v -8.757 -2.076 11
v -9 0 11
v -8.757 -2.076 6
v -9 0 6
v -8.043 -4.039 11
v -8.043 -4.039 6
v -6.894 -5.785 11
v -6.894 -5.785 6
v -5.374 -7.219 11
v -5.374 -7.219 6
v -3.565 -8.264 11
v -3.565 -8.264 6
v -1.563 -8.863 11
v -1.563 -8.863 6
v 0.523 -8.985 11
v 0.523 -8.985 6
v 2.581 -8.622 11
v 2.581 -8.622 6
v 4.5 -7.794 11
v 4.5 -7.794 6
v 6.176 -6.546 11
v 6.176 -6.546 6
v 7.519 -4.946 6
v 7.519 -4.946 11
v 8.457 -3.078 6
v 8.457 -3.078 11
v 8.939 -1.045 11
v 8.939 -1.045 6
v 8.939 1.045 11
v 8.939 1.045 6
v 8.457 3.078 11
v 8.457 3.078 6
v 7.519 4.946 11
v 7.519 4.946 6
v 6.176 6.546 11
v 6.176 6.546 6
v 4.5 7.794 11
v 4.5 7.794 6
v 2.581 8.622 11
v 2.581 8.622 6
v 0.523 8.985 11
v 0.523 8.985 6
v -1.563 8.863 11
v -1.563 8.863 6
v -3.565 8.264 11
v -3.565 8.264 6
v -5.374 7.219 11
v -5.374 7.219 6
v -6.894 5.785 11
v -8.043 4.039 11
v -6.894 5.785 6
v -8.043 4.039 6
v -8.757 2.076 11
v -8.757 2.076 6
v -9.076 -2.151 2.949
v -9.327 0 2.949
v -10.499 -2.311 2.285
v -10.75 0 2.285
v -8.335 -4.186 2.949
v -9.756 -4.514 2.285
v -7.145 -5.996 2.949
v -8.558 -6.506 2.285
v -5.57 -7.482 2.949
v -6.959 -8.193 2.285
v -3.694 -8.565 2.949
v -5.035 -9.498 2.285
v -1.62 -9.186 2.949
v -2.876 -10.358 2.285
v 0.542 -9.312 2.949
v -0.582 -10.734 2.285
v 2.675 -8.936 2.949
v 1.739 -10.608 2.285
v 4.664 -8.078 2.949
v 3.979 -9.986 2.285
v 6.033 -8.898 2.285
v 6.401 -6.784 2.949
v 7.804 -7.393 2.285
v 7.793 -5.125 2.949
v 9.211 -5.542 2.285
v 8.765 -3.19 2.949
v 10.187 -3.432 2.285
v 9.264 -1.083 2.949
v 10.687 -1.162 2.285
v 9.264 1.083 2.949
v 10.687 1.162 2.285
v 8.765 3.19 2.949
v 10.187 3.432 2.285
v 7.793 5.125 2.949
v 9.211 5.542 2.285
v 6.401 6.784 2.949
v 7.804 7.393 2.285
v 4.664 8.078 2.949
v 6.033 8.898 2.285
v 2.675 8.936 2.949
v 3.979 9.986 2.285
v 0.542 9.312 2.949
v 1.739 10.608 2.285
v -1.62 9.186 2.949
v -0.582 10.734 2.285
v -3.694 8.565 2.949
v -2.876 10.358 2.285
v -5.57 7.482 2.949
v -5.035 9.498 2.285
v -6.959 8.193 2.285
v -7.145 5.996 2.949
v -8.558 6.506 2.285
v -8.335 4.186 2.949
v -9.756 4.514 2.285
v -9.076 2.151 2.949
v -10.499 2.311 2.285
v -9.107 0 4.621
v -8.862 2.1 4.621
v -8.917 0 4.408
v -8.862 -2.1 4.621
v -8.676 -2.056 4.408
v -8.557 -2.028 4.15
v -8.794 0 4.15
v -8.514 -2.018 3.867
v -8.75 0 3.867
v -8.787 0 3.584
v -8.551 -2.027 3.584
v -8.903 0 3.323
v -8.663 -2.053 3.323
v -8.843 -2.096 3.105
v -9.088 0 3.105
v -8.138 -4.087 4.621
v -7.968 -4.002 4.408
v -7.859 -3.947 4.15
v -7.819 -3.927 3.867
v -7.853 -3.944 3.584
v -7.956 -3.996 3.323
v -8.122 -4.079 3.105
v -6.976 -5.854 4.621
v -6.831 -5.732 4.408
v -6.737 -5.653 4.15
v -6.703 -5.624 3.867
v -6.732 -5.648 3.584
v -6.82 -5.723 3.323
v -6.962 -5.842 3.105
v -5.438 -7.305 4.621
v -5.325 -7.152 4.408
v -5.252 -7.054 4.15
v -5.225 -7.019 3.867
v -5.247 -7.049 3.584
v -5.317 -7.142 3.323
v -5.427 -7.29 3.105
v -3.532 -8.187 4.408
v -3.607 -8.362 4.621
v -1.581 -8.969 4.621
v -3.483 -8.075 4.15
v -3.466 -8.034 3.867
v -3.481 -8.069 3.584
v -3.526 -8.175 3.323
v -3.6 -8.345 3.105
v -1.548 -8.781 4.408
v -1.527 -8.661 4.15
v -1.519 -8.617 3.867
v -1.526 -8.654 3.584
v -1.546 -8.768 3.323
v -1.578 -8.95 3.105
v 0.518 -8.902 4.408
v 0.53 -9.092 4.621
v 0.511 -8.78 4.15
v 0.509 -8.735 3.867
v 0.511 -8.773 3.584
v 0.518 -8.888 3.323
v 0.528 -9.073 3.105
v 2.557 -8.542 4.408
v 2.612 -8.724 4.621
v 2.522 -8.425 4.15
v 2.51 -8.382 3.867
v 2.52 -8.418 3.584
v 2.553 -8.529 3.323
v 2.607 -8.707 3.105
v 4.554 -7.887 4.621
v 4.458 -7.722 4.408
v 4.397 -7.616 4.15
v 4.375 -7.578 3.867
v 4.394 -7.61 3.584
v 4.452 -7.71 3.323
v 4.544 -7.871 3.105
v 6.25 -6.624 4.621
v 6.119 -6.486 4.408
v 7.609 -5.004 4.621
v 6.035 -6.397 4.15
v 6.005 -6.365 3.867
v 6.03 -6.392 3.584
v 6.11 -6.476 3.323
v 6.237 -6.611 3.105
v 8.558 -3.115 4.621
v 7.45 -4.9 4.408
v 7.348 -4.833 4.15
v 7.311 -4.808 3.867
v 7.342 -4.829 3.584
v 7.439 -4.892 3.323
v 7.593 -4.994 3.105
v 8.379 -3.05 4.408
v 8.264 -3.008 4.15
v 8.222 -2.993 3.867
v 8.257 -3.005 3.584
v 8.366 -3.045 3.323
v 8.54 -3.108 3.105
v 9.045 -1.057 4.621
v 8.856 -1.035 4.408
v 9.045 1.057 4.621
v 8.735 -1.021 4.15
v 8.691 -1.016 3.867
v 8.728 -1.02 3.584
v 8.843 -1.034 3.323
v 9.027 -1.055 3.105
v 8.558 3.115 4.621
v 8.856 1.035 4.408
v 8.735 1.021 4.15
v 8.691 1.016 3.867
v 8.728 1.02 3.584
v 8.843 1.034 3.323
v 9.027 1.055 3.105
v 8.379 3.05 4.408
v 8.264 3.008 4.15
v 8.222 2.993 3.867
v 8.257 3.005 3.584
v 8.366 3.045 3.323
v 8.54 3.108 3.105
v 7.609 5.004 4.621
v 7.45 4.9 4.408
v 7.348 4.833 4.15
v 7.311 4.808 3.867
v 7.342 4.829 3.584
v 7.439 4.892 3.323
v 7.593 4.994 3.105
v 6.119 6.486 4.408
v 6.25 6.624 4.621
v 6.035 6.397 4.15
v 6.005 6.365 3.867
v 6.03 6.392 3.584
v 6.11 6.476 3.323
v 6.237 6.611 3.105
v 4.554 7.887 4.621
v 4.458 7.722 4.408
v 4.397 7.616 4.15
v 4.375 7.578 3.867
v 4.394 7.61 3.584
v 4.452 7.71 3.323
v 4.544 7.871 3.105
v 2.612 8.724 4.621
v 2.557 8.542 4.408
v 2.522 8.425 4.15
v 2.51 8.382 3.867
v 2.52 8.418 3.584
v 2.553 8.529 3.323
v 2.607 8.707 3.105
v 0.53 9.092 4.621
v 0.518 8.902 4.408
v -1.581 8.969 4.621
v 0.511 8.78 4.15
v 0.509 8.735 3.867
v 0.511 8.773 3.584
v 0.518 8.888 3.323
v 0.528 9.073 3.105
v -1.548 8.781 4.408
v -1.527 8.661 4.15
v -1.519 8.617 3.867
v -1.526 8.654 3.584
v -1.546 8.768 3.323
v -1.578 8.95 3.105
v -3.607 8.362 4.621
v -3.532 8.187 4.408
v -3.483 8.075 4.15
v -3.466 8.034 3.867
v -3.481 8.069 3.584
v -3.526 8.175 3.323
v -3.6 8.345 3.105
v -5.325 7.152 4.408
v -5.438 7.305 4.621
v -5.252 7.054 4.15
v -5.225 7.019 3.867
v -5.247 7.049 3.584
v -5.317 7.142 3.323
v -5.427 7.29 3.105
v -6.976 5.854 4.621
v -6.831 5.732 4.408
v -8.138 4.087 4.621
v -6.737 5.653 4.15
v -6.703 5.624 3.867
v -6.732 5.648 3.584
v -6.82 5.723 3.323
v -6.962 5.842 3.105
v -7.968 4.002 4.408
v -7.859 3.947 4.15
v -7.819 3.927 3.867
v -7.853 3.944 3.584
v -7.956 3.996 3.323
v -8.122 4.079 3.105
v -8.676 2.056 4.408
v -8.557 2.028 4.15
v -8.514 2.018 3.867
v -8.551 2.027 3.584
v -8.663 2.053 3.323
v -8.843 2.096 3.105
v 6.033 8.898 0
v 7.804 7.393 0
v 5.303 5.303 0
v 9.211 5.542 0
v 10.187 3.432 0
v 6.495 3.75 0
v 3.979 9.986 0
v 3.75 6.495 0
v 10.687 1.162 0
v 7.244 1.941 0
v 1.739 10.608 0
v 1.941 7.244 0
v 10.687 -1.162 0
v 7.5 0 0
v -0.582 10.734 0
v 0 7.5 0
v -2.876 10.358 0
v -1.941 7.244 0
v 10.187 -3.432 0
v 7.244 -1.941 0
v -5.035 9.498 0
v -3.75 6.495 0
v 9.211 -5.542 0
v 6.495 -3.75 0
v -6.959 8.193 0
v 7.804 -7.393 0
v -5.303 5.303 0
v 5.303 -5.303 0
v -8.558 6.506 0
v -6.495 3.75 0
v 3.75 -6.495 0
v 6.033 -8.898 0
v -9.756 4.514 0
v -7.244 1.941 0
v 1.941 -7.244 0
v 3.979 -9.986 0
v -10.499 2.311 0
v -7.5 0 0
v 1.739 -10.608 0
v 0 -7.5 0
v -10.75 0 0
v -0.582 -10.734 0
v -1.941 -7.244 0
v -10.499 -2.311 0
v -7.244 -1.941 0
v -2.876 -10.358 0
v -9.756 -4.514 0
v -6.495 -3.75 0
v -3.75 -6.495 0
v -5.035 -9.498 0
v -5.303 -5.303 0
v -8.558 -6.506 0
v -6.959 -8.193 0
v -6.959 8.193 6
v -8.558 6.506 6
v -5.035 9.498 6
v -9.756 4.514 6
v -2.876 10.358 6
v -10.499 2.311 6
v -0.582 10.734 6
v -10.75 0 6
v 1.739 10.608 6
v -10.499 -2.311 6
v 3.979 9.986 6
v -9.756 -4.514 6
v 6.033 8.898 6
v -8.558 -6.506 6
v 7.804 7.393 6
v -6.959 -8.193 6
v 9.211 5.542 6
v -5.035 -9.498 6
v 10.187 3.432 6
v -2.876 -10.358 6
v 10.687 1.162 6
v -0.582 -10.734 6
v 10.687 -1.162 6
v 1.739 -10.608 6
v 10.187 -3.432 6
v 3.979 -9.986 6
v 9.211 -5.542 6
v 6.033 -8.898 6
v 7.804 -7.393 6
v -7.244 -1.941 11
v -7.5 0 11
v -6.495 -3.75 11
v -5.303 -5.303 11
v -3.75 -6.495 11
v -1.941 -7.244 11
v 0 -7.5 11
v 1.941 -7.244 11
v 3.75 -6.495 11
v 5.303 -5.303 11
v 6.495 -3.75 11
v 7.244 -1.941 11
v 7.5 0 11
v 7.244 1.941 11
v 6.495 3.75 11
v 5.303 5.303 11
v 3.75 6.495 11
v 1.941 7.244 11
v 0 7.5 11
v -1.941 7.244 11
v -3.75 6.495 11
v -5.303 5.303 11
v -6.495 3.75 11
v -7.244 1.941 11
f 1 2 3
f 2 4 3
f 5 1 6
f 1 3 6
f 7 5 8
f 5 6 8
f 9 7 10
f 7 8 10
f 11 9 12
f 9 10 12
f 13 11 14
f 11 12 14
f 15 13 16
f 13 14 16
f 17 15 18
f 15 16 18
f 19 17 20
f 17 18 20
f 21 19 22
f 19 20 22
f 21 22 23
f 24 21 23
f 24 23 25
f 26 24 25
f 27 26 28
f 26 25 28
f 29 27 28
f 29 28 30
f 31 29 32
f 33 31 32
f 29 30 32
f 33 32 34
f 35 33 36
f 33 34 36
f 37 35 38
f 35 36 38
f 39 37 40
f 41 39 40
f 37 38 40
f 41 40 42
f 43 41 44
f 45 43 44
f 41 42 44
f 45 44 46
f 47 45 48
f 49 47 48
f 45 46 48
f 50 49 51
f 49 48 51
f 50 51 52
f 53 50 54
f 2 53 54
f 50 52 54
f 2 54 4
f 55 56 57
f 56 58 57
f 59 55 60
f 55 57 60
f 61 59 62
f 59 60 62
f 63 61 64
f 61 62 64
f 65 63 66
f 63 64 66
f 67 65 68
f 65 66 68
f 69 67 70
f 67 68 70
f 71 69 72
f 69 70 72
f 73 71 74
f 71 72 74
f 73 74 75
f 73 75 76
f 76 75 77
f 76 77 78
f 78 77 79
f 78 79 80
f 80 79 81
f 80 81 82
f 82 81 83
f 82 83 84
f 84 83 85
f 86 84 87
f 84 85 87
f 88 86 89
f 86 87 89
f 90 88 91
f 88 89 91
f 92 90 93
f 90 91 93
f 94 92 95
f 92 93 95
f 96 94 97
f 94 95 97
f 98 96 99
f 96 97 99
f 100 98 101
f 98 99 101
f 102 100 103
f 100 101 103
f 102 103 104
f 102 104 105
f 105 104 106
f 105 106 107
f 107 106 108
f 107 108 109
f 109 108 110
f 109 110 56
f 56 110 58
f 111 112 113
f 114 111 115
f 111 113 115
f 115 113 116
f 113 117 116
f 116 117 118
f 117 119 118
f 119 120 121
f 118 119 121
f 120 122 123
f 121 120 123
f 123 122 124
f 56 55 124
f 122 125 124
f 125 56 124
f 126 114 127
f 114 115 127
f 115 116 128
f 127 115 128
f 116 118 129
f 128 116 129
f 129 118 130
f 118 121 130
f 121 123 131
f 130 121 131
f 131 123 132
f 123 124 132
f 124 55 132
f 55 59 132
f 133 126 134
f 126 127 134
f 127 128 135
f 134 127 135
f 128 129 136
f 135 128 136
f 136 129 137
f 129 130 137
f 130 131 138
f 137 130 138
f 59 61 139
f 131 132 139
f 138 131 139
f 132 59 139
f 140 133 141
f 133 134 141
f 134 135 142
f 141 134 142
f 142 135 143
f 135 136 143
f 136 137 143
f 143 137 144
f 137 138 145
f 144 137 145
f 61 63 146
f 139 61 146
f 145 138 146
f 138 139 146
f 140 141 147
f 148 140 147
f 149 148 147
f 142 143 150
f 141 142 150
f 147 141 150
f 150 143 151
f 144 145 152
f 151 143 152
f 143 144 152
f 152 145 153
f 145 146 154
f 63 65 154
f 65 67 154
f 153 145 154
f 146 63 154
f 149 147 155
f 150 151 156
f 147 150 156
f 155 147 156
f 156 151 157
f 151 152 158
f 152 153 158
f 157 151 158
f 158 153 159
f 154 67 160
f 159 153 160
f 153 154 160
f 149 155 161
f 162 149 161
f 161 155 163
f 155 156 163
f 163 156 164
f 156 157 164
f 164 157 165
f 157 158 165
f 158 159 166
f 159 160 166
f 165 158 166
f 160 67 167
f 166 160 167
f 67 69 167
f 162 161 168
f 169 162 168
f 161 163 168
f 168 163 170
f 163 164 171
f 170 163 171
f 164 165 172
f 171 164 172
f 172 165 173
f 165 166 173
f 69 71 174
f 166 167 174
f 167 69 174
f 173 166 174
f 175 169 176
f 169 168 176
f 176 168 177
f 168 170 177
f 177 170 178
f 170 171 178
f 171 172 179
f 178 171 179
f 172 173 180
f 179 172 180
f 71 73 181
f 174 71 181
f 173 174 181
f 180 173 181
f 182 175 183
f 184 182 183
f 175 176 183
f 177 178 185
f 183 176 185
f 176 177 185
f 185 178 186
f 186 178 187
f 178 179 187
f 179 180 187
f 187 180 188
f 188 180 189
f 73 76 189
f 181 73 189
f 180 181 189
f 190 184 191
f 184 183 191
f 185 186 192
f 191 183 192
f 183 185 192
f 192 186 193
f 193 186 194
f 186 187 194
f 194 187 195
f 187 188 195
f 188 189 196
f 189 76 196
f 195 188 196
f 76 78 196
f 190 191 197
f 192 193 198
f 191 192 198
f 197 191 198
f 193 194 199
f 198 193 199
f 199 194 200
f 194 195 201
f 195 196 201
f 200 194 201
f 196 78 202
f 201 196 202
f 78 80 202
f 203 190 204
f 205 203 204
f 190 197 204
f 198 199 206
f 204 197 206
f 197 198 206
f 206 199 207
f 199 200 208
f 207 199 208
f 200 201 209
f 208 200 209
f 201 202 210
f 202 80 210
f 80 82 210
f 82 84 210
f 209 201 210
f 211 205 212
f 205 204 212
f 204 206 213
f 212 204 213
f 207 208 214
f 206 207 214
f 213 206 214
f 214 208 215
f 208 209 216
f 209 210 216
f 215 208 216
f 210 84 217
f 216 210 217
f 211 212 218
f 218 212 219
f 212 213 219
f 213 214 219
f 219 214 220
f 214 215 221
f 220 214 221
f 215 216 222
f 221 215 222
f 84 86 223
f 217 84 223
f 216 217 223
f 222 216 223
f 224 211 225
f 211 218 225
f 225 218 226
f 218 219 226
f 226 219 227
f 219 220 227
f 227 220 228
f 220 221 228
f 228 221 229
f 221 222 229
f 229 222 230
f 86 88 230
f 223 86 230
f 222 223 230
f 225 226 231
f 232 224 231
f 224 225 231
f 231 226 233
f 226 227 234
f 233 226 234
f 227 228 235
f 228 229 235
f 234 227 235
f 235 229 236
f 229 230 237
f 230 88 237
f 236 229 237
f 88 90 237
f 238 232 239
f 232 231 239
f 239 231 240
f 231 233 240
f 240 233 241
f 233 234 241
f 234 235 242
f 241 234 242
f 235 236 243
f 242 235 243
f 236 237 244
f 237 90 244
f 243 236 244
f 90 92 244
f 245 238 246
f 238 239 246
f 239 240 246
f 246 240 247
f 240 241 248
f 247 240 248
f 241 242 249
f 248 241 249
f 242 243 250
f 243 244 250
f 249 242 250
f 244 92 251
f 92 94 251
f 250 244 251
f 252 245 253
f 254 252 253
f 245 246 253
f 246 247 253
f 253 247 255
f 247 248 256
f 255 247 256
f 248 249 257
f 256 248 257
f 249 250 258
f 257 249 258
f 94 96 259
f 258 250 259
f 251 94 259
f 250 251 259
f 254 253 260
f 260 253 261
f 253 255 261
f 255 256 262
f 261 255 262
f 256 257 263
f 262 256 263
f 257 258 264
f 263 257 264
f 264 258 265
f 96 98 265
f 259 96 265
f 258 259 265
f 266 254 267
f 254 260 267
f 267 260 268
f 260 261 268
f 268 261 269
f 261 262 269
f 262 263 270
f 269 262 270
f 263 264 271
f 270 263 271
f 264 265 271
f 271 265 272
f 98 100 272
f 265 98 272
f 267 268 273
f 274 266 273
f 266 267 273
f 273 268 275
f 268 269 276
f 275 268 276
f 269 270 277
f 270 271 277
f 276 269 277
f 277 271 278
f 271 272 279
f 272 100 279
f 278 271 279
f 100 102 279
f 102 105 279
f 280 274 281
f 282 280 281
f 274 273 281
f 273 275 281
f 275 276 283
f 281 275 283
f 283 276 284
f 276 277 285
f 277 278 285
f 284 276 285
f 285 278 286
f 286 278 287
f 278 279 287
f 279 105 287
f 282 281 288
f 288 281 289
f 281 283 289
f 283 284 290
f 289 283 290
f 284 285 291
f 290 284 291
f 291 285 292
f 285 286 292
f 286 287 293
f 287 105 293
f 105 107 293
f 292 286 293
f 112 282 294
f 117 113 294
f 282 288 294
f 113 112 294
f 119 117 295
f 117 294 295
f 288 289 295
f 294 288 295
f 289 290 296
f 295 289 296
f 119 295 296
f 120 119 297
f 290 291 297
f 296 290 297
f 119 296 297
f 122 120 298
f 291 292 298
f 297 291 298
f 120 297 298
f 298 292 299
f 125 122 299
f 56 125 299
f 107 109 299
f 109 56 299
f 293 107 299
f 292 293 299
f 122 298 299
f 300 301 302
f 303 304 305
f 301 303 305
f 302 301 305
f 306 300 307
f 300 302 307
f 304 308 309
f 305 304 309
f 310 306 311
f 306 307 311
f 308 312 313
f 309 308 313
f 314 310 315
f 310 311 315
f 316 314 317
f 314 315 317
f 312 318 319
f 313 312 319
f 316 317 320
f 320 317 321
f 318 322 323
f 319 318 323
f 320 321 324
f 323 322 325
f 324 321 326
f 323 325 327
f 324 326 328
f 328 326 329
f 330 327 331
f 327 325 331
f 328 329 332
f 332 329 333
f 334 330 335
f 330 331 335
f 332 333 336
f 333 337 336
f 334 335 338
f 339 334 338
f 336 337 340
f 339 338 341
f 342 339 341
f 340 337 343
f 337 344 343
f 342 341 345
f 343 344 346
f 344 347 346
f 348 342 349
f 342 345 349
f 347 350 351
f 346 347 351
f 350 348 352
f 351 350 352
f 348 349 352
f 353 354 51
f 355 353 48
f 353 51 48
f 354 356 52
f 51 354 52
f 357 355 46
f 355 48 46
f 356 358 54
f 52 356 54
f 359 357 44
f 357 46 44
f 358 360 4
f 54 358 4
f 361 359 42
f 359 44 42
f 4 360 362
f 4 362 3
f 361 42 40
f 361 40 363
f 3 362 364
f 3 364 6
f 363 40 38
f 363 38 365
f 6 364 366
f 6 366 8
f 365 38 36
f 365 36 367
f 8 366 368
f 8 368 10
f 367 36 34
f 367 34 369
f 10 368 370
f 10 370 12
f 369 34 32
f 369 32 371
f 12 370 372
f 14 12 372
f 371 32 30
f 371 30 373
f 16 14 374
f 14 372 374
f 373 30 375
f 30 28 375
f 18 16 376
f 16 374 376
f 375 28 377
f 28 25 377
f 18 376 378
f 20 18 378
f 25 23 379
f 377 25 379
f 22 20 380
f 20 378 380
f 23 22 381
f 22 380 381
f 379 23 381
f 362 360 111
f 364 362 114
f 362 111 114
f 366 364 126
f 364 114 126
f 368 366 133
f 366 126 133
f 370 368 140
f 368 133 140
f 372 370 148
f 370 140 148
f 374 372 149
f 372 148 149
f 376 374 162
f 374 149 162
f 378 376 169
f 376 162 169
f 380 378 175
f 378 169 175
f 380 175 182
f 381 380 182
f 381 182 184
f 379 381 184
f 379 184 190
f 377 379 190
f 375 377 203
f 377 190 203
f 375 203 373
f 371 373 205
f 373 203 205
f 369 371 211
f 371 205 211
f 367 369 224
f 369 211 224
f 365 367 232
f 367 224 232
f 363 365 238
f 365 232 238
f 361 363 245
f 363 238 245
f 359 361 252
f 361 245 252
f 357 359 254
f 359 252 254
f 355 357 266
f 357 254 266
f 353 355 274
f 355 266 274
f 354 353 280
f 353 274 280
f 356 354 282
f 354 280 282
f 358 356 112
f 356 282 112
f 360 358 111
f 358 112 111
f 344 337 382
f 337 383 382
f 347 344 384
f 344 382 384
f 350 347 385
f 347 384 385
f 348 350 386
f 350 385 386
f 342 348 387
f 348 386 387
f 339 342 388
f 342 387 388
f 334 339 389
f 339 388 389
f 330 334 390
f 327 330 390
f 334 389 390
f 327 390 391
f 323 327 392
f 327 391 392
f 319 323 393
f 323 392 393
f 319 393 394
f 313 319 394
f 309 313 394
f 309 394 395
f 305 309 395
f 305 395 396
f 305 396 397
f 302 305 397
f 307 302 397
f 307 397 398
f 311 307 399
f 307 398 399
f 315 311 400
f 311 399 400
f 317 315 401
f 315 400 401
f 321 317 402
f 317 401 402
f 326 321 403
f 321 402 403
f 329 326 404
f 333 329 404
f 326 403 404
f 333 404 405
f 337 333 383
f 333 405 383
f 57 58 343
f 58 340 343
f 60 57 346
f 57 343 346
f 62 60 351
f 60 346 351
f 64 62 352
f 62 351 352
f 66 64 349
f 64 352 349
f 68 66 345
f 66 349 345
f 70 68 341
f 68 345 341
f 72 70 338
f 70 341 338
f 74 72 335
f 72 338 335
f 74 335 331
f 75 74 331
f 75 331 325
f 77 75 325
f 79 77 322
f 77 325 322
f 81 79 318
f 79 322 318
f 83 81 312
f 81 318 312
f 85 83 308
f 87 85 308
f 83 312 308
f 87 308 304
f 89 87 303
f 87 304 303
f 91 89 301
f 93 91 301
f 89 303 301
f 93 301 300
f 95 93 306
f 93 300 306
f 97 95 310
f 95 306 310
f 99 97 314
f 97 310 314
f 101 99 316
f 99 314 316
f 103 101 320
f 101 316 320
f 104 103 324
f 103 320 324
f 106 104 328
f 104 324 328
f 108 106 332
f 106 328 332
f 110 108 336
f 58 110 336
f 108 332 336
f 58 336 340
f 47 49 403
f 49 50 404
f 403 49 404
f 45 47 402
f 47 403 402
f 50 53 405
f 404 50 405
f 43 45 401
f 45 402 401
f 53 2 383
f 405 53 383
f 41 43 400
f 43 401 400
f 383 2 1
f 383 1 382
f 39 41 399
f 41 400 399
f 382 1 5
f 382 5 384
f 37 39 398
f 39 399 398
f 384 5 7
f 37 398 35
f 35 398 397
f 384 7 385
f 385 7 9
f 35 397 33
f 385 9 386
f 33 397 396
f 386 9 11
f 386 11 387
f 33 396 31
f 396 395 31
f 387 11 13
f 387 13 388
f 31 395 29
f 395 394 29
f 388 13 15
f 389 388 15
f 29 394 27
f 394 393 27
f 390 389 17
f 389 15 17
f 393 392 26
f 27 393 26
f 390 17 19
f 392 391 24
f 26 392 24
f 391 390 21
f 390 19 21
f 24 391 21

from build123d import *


with BuildPart() as f1:
    # F0 (on Front) → F1 (revolve)
    with BuildSketch(Plane.XZ):
        with BuildLine():
            Line((-10.75, 0), (-7.5, 0))
            Line((-7.5, 0), (-7.5, 11))
            Line((-7.5, 11), (-9, 11))
            Line((-9, 11), (-9, 6))
            Line((-9, 6), (-10.75, 6))
            Line((-10.75, 6), (-9.107077, 4.620931))
            ThreePointArc((-9.107077, 4.620931), (-8.758565, 3.724398), (-9.32736, 2.948702))
            Line((-9.32736, 2.948702), (-10.75, 2.285273))
            Line((-10.75, 2.285273), (-10.75, 0.665314))
            Line((-10.75, 0.665314), (-10.75, 0))
        make_face()
    revolve(axis=Axis((0, 0, 13.534962), (0, 0, 1)))


solid = f1.part
